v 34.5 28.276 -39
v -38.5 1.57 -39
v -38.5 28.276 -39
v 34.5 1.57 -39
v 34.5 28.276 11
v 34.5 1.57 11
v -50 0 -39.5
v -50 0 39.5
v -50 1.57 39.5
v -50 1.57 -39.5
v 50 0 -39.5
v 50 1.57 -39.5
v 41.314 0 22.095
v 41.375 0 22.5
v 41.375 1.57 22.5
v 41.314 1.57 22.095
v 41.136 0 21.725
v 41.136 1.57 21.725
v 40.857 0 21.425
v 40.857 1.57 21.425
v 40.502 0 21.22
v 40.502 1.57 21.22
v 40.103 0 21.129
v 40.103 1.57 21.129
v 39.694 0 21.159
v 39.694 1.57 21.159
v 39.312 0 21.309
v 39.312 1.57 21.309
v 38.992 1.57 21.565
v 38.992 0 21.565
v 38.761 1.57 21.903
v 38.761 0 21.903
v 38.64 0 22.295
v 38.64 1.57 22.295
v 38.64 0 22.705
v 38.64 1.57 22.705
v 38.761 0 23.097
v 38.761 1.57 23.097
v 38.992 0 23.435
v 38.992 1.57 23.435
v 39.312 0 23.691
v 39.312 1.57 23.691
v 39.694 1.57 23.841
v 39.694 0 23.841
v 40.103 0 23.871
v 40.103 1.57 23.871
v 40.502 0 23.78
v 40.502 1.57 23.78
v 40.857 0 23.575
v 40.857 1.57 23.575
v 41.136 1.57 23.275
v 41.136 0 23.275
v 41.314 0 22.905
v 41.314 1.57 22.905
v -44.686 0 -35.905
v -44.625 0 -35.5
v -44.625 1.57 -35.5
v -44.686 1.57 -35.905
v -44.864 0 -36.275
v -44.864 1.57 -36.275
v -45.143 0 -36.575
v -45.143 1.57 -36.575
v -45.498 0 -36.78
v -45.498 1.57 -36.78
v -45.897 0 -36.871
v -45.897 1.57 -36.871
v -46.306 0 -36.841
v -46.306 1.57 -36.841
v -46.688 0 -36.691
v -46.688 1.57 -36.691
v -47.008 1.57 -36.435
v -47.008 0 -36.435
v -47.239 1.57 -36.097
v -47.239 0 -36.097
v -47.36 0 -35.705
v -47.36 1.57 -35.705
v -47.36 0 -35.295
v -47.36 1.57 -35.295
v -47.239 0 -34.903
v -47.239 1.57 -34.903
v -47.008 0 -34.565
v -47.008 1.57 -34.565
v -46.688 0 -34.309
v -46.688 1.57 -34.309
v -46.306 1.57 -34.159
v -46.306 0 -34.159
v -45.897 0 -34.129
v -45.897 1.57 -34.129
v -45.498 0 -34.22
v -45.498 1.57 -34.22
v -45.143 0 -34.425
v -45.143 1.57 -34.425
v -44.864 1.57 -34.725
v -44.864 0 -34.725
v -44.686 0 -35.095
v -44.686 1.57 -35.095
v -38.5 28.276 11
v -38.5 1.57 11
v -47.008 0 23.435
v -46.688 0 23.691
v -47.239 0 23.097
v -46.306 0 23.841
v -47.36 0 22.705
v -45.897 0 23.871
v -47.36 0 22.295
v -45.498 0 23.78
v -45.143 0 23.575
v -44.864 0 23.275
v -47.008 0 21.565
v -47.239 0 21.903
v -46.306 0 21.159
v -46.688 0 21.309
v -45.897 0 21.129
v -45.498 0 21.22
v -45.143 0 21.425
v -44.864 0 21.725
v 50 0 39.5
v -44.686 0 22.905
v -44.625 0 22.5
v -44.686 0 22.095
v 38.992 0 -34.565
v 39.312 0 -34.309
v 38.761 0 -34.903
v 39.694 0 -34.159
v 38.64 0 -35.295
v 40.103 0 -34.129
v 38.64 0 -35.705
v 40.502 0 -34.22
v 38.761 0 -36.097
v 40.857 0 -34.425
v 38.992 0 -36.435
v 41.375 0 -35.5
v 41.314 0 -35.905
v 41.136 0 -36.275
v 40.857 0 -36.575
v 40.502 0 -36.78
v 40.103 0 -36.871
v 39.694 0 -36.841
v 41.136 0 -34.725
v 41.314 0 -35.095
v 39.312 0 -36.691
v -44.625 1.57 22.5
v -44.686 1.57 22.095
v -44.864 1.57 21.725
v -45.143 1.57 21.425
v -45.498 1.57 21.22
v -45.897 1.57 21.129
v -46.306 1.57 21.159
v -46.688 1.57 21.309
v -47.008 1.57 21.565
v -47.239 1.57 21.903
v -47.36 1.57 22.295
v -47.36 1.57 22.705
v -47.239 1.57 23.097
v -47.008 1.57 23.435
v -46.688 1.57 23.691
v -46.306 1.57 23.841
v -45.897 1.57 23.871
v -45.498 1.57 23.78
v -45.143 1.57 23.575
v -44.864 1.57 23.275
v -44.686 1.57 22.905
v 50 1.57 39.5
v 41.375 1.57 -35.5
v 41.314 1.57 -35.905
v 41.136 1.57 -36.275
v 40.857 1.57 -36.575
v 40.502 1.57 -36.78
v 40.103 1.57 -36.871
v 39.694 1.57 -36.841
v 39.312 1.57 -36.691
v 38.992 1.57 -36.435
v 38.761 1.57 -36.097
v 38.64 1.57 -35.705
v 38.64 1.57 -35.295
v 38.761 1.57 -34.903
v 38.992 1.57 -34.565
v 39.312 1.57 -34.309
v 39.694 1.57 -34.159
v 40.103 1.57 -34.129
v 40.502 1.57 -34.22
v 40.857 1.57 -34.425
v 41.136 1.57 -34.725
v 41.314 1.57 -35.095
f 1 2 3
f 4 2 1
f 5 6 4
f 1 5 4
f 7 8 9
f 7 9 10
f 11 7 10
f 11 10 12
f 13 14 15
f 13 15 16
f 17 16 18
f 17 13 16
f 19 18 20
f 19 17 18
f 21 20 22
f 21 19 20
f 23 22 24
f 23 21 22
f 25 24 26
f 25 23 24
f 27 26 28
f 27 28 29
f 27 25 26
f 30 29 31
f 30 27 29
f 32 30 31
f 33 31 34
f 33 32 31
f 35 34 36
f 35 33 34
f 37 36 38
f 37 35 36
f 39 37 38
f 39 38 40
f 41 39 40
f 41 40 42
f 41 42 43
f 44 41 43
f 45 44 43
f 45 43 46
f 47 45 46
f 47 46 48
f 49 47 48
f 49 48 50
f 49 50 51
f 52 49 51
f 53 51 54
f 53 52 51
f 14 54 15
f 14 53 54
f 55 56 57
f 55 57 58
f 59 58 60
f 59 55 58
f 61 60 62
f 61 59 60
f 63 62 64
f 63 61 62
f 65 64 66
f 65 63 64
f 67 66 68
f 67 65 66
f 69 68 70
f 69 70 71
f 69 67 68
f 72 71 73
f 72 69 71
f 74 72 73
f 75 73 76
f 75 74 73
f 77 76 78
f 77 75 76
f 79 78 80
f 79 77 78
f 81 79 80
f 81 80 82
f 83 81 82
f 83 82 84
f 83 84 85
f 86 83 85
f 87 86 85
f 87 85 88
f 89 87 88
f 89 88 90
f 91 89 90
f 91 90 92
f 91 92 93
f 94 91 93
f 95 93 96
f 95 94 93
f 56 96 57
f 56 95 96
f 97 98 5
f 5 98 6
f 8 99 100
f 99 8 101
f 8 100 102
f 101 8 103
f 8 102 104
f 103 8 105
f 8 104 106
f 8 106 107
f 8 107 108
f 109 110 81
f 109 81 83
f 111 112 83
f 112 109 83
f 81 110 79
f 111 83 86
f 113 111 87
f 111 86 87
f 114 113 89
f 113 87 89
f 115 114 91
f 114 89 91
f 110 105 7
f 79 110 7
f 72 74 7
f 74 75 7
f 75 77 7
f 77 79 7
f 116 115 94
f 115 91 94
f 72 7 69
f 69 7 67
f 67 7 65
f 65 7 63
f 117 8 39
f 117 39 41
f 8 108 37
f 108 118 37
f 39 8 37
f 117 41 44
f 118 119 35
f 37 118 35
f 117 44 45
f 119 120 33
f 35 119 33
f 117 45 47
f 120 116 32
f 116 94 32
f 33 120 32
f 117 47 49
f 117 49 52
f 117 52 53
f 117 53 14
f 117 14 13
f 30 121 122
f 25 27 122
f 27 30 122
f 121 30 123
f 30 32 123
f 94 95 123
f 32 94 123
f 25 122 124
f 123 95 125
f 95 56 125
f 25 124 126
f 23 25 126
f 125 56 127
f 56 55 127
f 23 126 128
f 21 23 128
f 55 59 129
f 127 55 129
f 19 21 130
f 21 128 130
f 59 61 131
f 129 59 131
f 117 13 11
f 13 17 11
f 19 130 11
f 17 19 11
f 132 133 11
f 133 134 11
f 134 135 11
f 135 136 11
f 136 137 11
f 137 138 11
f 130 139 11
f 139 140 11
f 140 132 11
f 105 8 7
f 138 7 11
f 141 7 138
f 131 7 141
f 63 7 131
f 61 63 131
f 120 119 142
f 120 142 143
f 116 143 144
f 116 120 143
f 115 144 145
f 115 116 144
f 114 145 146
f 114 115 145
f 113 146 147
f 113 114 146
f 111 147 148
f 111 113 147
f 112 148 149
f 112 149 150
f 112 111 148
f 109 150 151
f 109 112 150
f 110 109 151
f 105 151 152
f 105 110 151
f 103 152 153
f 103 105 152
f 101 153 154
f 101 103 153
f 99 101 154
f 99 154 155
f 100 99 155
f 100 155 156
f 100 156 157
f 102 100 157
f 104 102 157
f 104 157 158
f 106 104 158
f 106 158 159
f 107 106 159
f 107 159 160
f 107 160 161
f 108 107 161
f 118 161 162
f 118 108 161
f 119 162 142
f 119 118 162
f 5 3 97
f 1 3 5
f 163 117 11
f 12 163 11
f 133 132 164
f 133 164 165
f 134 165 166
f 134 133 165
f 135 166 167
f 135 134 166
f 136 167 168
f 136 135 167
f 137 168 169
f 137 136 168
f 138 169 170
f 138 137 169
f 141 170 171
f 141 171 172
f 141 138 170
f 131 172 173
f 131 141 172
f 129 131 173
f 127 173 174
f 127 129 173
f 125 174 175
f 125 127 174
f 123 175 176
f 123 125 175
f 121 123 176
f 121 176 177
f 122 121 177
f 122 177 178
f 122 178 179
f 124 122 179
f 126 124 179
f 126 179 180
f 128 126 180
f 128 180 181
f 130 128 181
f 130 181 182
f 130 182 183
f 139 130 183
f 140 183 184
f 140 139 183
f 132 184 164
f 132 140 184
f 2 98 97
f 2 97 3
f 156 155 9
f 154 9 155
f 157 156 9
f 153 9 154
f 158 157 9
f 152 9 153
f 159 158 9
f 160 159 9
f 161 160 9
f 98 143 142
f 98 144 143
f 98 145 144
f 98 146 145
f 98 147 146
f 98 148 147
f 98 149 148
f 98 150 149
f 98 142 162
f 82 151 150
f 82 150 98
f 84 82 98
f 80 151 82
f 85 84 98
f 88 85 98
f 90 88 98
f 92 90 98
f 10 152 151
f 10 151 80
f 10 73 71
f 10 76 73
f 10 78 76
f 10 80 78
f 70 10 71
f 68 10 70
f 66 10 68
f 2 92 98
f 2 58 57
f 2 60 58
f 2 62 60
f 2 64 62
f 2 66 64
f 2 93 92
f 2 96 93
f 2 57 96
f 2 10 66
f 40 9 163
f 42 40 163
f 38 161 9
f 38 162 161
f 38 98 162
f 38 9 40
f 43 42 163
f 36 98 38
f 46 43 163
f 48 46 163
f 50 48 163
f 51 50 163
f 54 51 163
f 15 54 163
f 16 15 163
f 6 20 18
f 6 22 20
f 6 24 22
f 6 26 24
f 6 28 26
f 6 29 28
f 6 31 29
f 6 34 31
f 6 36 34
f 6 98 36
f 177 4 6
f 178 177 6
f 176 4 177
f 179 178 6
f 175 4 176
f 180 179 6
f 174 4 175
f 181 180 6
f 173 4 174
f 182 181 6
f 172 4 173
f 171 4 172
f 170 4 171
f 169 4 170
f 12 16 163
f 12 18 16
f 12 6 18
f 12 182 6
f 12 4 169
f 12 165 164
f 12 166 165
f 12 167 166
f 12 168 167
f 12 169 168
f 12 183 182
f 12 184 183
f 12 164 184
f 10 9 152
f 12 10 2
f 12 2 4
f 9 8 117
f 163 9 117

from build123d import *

# Parameters (mm, degrees)
SKETCH1_W           = 100
SKETCH1_H           = 79
SKETCH1_R           = 1.375
BOSS_EXTRUDE1_DEPTH = 1.57
SKETCH2_W           = 73
SKETCH2_H           = 50
BOSS_EXTRUDE2_DEPTH = 26.706


with BuildPart() as part:
    # Sketch1 → Boss-Extrude1 (new body)
    with BuildSketch(Plane(origin=(0, 0, 0), x_dir=(1, 0, 0), z_dir=(0, 1, 0))):
        Rectangle(SKETCH1_W, SKETCH1_H)
        with Locations((-46, 35.5)):
            Circle(SKETCH1_R, mode=Mode.SUBTRACT)
        with Locations((40, 35.5)):
            Circle(SKETCH1_R, mode=Mode.SUBTRACT)
        with Locations((-46, -22.5)):
            Circle(SKETCH1_R, mode=Mode.SUBTRACT)
        with Locations((40, -22.5)):
            Circle(SKETCH1_R, mode=Mode.SUBTRACT)
    extrude(amount=BOSS_EXTRUDE1_DEPTH)

    # Sketch2 → Boss-Extrude2 (add)
    with BuildSketch(Plane(origin=(0, 1.57, 0), x_dir=(1, 0, 0), z_dir=(0, 1, 0))):
        with Locations((-2, 14)):
            Rectangle(SKETCH2_W, SKETCH2_H)
    extrude(amount=BOSS_EXTRUDE2_DEPTH)


solid = part.part
